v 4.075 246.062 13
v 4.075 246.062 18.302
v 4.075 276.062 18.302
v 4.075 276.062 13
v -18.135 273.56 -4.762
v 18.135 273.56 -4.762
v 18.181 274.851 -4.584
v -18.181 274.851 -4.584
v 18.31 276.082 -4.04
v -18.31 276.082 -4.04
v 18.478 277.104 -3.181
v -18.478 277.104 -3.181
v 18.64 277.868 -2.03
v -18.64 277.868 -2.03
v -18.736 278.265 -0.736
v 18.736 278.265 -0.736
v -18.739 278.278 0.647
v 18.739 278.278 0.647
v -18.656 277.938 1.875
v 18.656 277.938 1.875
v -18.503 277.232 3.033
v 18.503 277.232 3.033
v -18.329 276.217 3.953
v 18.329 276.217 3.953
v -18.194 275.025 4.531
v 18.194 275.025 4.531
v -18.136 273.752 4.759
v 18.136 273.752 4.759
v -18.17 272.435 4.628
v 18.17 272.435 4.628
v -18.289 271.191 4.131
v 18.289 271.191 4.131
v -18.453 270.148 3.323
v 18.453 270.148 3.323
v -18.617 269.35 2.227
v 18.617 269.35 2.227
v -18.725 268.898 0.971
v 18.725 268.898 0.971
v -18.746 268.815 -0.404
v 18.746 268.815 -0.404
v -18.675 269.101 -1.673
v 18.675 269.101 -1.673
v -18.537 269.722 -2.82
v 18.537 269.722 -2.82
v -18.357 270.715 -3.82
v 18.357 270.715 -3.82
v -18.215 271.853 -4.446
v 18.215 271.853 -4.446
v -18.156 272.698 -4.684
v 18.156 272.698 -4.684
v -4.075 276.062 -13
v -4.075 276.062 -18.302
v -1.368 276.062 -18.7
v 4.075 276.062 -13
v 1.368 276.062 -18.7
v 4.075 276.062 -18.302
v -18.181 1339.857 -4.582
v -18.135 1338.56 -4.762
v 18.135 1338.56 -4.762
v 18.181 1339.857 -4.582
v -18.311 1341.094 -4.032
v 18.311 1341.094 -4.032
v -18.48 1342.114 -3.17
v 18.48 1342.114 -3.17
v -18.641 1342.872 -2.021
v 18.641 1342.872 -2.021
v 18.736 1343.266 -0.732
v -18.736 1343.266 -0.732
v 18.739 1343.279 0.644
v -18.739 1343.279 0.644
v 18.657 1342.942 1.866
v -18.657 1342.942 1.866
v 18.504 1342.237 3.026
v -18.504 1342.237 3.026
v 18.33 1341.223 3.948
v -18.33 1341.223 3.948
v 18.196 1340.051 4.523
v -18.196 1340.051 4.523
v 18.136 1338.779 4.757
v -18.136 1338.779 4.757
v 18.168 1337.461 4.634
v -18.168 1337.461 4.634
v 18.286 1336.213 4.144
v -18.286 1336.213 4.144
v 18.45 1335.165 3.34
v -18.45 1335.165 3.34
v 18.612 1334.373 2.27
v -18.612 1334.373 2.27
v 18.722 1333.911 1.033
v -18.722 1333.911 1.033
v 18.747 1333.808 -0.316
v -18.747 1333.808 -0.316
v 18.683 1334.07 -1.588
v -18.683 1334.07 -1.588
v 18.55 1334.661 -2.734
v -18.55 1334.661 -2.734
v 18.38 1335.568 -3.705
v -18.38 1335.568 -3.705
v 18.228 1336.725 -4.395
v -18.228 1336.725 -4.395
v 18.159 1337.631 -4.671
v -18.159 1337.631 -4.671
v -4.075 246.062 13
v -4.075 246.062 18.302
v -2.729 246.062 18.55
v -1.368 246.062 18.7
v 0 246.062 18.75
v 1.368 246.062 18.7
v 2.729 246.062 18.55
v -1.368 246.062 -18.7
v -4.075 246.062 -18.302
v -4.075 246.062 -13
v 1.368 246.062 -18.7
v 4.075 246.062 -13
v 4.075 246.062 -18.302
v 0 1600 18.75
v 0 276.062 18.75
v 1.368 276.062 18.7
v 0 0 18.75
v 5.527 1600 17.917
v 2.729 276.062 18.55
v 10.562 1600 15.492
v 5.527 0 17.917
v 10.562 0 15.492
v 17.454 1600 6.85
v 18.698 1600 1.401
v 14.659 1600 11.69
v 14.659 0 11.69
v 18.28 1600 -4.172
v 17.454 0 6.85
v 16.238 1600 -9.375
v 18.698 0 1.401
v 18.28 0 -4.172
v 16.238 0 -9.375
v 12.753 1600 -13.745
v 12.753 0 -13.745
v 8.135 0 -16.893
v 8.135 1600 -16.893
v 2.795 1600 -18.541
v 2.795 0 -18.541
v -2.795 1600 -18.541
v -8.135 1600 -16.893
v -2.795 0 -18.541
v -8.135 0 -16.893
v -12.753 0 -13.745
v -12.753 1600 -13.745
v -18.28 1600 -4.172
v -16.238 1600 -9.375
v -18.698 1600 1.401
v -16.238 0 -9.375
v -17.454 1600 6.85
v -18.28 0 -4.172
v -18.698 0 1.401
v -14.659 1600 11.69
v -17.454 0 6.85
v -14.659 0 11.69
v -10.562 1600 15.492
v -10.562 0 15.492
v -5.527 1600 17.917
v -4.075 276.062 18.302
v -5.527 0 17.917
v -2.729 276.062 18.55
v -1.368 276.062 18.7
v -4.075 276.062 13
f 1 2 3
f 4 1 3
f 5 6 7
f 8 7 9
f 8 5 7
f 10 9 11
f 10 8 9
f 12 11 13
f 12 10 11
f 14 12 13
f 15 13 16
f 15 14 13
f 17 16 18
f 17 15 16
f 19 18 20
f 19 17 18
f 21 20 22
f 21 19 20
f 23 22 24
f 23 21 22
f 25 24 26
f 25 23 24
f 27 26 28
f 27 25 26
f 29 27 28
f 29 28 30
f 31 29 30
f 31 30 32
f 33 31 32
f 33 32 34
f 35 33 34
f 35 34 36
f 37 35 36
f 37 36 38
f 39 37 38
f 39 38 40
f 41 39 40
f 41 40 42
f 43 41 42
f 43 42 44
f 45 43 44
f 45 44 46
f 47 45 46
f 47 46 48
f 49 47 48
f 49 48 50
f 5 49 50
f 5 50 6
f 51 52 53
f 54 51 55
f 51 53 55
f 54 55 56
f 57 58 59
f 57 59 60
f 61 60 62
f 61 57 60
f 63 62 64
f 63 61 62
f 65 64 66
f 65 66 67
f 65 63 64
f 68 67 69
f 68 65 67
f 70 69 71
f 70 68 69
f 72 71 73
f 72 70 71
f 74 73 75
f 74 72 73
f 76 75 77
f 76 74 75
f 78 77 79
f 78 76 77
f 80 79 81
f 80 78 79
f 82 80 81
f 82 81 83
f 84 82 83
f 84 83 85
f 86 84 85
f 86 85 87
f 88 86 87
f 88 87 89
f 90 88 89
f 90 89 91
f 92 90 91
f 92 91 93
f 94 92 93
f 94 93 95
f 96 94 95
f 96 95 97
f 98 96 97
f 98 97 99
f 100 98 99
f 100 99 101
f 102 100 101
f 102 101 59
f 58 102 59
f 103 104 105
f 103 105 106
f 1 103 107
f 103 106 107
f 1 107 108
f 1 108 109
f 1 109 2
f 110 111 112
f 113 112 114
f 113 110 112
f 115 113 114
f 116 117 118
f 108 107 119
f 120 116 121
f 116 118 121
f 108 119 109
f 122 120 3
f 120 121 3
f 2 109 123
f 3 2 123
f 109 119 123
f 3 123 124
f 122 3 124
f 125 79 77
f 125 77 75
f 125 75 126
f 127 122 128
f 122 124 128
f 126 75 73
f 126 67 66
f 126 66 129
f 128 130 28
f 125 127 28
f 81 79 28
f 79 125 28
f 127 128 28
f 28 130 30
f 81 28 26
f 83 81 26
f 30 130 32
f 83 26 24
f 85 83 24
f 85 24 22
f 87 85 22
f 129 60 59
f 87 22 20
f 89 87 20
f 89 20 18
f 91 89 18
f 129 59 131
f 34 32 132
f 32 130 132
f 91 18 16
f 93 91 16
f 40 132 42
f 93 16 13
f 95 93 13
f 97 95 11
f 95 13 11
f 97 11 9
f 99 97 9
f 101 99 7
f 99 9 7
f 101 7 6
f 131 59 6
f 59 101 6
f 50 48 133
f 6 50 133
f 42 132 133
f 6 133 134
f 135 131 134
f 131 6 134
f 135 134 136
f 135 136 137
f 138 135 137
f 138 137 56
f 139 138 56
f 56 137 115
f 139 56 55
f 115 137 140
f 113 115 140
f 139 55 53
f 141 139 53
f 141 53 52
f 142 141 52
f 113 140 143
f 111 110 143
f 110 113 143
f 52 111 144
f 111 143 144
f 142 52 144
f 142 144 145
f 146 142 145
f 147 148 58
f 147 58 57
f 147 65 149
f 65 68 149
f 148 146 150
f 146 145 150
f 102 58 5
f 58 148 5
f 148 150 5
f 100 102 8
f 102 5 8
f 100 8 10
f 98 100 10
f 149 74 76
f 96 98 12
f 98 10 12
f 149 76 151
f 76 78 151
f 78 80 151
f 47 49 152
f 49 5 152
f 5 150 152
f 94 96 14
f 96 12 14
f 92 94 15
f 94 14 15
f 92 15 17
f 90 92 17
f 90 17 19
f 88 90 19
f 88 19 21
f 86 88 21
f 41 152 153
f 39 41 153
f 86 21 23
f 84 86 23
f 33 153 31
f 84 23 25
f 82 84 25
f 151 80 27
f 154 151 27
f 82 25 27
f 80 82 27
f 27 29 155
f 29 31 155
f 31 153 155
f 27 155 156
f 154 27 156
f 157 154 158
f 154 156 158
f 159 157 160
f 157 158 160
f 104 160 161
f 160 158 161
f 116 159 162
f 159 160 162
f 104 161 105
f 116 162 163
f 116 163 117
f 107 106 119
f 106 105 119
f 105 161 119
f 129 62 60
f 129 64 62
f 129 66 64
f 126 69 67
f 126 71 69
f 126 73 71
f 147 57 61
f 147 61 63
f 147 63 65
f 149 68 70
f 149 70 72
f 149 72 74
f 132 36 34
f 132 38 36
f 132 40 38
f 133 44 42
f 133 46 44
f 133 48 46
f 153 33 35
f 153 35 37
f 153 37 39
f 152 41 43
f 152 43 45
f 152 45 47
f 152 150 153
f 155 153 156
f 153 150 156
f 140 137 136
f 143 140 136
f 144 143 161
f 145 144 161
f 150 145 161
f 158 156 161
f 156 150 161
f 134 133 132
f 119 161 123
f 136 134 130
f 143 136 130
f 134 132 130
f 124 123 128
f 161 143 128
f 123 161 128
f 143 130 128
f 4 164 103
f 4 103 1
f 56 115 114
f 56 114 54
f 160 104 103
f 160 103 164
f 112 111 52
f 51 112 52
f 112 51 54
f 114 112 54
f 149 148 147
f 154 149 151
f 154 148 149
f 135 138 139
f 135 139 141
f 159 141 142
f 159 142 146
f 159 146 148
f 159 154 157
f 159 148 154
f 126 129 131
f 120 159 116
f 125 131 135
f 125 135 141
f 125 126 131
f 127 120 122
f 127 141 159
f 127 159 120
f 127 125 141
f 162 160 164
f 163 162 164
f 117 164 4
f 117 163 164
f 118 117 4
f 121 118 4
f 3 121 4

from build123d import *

# Parameters (mm, degrees)
CROQUIS1_R                 = 18.75
SALIENTE_EXTRUIR1_DEPTH    = 1600
CROQUIS3_W                 = 8.15
CROQUIS3_H                 = 30
CORTAR_EXTRUIR1_DEPTH      = 5.75
CORTAR_EXTRUIR2_DEPTH      = 1601.219711477
CORTAR_EXTRUIR2_DEPTH_BACK = 1601.219711477
CROQUIS5_R                 = 4.7625
CORTAR_EXTRUIR3_DEPTH      = 1601.219711579
CORTAR_EXTRUIR3_DEPTH_BACK = 1601.219711579
CROQUIS6_R                 = 4.7625


with BuildPart() as part:
    # Croquis1 → Saliente-Extruir1 (new body)
    with BuildSketch(Plane(origin=(0, 0, 0), x_dir=(1, 0, 0), z_dir=(0, 1, 0))):
        with Locations(Location((0, 0, 0), (0, 0, 270))):
            Circle(CROQUIS1_R)
    extrude(amount=SALIENTE_EXTRUIR1_DEPTH)

    # Croquis3 → Cortar-Extruir1 (cut)
    with BuildSketch(Plane.XY.offset(18.75)):
        with Locations((0, 261.062165694)):
            Rectangle(CROQUIS3_W, CROQUIS3_H)
    cortar_extruir1 = extrude(amount=-CORTAR_EXTRUIR1_DEPTH, mode=Mode.SUBTRACT)

    # Simetría1: Cortar-Extruir1 across plane
    add(cortar_extruir1.mirror(Plane.XY), mode=Mode.SUBTRACT)

    # Croquis5 → Cortar-Extruir2 (cut, two sides: drawn at the far end of the back side and taken through both)
    with BuildSketch(Plane(origin=(0, 0, 0), x_dir=(0, 0, -1), z_dir=(1, 0, 0)).offset(-CORTAR_EXTRUIR2_DEPTH_BACK)):
        with Locations((0, 273.56)):
            Circle(CROQUIS5_R)
    extrude(amount=CORTAR_EXTRUIR2_DEPTH + CORTAR_EXTRUIR2_DEPTH_BACK, mode=Mode.SUBTRACT)

    # Croquis6 → Cortar-Extruir3 (cut, two sides: drawn at the far end of the back side and taken through both)
    with BuildSketch(Plane(origin=(0, 0, 0), x_dir=(0, 0, -1), z_dir=(1, 0, 0)).offset(-CORTAR_EXTRUIR3_DEPTH_BACK)):
        with Locations((0, 1338.56)):
            Circle(CROQUIS6_R)
    extrude(amount=CORTAR_EXTRUIR3_DEPTH + CORTAR_EXTRUIR3_DEPTH_BACK, mode=Mode.SUBTRACT)


solid = part.part
